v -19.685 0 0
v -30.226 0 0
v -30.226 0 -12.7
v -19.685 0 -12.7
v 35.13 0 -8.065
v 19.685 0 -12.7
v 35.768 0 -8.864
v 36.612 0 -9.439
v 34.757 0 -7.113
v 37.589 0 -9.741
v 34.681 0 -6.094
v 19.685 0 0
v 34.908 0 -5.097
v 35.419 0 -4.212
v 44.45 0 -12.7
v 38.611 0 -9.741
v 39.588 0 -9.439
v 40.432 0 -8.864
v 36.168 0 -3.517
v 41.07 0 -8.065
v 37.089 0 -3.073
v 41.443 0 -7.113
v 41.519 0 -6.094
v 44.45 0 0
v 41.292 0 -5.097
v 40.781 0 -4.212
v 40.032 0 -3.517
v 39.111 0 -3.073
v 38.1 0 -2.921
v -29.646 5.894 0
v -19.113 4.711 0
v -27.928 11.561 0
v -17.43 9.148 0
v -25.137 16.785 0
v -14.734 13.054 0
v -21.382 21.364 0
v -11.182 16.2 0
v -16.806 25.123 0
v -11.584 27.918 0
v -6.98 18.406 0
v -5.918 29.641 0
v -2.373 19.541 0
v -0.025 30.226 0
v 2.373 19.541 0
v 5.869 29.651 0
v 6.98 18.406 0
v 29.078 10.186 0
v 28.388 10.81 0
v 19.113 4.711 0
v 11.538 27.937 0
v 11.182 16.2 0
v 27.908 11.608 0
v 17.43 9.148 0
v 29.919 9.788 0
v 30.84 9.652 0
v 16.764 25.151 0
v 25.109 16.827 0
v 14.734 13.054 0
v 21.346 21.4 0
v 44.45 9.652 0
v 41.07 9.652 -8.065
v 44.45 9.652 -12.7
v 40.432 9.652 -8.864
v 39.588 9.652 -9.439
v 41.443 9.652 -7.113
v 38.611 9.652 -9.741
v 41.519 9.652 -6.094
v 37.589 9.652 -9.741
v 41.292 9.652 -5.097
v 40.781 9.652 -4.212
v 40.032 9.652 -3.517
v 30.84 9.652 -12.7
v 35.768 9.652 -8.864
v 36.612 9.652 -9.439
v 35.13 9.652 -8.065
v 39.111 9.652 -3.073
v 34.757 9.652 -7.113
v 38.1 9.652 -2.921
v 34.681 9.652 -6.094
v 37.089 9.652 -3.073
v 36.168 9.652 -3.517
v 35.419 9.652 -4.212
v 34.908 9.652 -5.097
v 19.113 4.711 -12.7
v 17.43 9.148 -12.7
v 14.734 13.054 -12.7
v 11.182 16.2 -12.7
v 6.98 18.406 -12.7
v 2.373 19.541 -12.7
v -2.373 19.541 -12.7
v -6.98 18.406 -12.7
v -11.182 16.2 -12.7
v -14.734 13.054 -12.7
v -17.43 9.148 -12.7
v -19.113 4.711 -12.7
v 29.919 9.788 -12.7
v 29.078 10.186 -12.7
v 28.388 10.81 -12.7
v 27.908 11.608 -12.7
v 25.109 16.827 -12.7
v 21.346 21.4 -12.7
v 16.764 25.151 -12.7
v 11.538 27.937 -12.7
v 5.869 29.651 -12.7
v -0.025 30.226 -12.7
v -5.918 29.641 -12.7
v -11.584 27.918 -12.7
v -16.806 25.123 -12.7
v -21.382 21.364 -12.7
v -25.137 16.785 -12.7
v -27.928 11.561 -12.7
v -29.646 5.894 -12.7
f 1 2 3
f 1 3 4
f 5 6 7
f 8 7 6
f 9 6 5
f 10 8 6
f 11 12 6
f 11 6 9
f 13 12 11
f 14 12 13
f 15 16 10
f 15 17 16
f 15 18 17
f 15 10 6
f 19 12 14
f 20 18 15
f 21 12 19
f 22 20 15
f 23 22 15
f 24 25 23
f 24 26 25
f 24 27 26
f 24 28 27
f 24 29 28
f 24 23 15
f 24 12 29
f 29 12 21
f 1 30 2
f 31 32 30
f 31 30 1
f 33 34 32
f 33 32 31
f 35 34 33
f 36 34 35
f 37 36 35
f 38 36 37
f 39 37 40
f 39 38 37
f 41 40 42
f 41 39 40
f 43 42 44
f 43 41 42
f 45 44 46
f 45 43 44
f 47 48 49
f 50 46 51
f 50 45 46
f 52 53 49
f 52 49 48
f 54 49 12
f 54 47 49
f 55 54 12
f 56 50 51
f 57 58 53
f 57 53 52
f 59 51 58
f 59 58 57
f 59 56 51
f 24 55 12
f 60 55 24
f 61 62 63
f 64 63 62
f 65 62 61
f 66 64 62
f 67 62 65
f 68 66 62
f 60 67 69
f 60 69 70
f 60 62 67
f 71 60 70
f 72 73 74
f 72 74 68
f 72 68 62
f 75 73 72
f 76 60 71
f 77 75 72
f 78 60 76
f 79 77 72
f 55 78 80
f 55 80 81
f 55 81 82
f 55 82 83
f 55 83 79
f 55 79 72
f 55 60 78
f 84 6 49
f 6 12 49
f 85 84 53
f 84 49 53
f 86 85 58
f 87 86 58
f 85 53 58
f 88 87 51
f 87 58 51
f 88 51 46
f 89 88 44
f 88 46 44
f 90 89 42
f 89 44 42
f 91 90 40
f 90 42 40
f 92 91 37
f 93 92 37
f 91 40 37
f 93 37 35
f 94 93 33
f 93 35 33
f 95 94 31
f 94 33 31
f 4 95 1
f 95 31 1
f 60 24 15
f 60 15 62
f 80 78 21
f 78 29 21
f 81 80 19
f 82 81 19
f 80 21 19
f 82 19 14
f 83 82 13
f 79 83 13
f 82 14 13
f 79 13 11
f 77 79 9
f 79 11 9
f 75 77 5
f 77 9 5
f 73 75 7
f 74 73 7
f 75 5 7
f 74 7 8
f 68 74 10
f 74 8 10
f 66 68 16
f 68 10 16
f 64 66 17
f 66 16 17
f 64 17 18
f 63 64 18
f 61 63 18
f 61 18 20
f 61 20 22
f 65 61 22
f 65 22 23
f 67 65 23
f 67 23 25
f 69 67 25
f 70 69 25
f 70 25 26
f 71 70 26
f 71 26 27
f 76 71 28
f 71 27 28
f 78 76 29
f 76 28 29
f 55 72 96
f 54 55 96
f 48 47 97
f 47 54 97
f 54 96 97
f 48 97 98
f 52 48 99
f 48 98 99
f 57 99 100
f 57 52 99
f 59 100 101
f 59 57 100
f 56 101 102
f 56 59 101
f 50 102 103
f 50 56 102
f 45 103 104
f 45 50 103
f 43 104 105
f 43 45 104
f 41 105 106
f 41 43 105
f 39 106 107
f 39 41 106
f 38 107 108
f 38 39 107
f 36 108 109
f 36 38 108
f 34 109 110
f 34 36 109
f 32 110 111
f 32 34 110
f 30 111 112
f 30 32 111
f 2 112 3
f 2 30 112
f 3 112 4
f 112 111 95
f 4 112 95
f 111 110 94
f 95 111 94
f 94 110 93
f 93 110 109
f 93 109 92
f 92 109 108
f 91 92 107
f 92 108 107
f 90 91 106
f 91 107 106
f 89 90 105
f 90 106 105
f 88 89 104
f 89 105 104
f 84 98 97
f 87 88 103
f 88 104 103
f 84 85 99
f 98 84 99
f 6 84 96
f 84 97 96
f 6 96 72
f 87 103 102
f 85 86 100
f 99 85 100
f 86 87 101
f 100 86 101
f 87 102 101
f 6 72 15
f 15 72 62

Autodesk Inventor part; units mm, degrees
ref_plane "YZ Plane" through (0, 0, 0) normal (1, 0, 0) x (0, 1, 0)
ref_plane "XZ Plane" through (0, 0, 0) normal (0, 1, 0) x (-1, 0, 0)
ref_plane "XY Plane" through (0, 0, 0) normal (0, 0, 1) x (1, 0, 0)
sketch "Sketch1" plane through (0, 0, 0) normal (0, 0, 1) x (1, 0, 0)
  arc A0 (19.685, 0) -> (-19.685, 0) centre (0, 0) ccw
  arc A1 (28.6435, 9.652) -> (-30.226, 0) centre (0, 0) ccw
  line L0 (44.45, 0) -> (44.45, 9.652)
  line L1 (44.45, 9.652) -> (28.6435, 9.652)
  line L2 (-30.226, 0) -> (-19.685, 0)
  line L3 (19.685, 0) -> (44.45, 0)
  dimension "d0" = 39.37
  dimension "d1" = 60.452
  dimension "d2" = 44.45
  dimension "d15" = 9.652
extrude "Extrusion1" add sketch "Sketch1" against normal blind 12.7
fillet "Fillet1" radius 3.175 1 edges at (28.6435, 9.652, -6.35)
sketch "Sketch2" plane through (44.45, 9.652, 0) normal (0, 1, 0) x (1, 0, 0)
  line L0 (0, 0) -> (0, 12.7) projected
  line L1 (-13.6102, 12.7) -> (0, 12.7) projected
  point P0 (-44.45, 0)
  point P1 (-6.35, 6.35)
  dimension "d6" = 6.35
  dimension "d7" = 6.35
hole "Hole1" at (38.1, 9.652, -6.35) direction (0, -1, 0) diameter 6.858 end through all
equation "\"d7\" = d6"
properties part number "GE-13039" material "Polycarbonate, Clear"
